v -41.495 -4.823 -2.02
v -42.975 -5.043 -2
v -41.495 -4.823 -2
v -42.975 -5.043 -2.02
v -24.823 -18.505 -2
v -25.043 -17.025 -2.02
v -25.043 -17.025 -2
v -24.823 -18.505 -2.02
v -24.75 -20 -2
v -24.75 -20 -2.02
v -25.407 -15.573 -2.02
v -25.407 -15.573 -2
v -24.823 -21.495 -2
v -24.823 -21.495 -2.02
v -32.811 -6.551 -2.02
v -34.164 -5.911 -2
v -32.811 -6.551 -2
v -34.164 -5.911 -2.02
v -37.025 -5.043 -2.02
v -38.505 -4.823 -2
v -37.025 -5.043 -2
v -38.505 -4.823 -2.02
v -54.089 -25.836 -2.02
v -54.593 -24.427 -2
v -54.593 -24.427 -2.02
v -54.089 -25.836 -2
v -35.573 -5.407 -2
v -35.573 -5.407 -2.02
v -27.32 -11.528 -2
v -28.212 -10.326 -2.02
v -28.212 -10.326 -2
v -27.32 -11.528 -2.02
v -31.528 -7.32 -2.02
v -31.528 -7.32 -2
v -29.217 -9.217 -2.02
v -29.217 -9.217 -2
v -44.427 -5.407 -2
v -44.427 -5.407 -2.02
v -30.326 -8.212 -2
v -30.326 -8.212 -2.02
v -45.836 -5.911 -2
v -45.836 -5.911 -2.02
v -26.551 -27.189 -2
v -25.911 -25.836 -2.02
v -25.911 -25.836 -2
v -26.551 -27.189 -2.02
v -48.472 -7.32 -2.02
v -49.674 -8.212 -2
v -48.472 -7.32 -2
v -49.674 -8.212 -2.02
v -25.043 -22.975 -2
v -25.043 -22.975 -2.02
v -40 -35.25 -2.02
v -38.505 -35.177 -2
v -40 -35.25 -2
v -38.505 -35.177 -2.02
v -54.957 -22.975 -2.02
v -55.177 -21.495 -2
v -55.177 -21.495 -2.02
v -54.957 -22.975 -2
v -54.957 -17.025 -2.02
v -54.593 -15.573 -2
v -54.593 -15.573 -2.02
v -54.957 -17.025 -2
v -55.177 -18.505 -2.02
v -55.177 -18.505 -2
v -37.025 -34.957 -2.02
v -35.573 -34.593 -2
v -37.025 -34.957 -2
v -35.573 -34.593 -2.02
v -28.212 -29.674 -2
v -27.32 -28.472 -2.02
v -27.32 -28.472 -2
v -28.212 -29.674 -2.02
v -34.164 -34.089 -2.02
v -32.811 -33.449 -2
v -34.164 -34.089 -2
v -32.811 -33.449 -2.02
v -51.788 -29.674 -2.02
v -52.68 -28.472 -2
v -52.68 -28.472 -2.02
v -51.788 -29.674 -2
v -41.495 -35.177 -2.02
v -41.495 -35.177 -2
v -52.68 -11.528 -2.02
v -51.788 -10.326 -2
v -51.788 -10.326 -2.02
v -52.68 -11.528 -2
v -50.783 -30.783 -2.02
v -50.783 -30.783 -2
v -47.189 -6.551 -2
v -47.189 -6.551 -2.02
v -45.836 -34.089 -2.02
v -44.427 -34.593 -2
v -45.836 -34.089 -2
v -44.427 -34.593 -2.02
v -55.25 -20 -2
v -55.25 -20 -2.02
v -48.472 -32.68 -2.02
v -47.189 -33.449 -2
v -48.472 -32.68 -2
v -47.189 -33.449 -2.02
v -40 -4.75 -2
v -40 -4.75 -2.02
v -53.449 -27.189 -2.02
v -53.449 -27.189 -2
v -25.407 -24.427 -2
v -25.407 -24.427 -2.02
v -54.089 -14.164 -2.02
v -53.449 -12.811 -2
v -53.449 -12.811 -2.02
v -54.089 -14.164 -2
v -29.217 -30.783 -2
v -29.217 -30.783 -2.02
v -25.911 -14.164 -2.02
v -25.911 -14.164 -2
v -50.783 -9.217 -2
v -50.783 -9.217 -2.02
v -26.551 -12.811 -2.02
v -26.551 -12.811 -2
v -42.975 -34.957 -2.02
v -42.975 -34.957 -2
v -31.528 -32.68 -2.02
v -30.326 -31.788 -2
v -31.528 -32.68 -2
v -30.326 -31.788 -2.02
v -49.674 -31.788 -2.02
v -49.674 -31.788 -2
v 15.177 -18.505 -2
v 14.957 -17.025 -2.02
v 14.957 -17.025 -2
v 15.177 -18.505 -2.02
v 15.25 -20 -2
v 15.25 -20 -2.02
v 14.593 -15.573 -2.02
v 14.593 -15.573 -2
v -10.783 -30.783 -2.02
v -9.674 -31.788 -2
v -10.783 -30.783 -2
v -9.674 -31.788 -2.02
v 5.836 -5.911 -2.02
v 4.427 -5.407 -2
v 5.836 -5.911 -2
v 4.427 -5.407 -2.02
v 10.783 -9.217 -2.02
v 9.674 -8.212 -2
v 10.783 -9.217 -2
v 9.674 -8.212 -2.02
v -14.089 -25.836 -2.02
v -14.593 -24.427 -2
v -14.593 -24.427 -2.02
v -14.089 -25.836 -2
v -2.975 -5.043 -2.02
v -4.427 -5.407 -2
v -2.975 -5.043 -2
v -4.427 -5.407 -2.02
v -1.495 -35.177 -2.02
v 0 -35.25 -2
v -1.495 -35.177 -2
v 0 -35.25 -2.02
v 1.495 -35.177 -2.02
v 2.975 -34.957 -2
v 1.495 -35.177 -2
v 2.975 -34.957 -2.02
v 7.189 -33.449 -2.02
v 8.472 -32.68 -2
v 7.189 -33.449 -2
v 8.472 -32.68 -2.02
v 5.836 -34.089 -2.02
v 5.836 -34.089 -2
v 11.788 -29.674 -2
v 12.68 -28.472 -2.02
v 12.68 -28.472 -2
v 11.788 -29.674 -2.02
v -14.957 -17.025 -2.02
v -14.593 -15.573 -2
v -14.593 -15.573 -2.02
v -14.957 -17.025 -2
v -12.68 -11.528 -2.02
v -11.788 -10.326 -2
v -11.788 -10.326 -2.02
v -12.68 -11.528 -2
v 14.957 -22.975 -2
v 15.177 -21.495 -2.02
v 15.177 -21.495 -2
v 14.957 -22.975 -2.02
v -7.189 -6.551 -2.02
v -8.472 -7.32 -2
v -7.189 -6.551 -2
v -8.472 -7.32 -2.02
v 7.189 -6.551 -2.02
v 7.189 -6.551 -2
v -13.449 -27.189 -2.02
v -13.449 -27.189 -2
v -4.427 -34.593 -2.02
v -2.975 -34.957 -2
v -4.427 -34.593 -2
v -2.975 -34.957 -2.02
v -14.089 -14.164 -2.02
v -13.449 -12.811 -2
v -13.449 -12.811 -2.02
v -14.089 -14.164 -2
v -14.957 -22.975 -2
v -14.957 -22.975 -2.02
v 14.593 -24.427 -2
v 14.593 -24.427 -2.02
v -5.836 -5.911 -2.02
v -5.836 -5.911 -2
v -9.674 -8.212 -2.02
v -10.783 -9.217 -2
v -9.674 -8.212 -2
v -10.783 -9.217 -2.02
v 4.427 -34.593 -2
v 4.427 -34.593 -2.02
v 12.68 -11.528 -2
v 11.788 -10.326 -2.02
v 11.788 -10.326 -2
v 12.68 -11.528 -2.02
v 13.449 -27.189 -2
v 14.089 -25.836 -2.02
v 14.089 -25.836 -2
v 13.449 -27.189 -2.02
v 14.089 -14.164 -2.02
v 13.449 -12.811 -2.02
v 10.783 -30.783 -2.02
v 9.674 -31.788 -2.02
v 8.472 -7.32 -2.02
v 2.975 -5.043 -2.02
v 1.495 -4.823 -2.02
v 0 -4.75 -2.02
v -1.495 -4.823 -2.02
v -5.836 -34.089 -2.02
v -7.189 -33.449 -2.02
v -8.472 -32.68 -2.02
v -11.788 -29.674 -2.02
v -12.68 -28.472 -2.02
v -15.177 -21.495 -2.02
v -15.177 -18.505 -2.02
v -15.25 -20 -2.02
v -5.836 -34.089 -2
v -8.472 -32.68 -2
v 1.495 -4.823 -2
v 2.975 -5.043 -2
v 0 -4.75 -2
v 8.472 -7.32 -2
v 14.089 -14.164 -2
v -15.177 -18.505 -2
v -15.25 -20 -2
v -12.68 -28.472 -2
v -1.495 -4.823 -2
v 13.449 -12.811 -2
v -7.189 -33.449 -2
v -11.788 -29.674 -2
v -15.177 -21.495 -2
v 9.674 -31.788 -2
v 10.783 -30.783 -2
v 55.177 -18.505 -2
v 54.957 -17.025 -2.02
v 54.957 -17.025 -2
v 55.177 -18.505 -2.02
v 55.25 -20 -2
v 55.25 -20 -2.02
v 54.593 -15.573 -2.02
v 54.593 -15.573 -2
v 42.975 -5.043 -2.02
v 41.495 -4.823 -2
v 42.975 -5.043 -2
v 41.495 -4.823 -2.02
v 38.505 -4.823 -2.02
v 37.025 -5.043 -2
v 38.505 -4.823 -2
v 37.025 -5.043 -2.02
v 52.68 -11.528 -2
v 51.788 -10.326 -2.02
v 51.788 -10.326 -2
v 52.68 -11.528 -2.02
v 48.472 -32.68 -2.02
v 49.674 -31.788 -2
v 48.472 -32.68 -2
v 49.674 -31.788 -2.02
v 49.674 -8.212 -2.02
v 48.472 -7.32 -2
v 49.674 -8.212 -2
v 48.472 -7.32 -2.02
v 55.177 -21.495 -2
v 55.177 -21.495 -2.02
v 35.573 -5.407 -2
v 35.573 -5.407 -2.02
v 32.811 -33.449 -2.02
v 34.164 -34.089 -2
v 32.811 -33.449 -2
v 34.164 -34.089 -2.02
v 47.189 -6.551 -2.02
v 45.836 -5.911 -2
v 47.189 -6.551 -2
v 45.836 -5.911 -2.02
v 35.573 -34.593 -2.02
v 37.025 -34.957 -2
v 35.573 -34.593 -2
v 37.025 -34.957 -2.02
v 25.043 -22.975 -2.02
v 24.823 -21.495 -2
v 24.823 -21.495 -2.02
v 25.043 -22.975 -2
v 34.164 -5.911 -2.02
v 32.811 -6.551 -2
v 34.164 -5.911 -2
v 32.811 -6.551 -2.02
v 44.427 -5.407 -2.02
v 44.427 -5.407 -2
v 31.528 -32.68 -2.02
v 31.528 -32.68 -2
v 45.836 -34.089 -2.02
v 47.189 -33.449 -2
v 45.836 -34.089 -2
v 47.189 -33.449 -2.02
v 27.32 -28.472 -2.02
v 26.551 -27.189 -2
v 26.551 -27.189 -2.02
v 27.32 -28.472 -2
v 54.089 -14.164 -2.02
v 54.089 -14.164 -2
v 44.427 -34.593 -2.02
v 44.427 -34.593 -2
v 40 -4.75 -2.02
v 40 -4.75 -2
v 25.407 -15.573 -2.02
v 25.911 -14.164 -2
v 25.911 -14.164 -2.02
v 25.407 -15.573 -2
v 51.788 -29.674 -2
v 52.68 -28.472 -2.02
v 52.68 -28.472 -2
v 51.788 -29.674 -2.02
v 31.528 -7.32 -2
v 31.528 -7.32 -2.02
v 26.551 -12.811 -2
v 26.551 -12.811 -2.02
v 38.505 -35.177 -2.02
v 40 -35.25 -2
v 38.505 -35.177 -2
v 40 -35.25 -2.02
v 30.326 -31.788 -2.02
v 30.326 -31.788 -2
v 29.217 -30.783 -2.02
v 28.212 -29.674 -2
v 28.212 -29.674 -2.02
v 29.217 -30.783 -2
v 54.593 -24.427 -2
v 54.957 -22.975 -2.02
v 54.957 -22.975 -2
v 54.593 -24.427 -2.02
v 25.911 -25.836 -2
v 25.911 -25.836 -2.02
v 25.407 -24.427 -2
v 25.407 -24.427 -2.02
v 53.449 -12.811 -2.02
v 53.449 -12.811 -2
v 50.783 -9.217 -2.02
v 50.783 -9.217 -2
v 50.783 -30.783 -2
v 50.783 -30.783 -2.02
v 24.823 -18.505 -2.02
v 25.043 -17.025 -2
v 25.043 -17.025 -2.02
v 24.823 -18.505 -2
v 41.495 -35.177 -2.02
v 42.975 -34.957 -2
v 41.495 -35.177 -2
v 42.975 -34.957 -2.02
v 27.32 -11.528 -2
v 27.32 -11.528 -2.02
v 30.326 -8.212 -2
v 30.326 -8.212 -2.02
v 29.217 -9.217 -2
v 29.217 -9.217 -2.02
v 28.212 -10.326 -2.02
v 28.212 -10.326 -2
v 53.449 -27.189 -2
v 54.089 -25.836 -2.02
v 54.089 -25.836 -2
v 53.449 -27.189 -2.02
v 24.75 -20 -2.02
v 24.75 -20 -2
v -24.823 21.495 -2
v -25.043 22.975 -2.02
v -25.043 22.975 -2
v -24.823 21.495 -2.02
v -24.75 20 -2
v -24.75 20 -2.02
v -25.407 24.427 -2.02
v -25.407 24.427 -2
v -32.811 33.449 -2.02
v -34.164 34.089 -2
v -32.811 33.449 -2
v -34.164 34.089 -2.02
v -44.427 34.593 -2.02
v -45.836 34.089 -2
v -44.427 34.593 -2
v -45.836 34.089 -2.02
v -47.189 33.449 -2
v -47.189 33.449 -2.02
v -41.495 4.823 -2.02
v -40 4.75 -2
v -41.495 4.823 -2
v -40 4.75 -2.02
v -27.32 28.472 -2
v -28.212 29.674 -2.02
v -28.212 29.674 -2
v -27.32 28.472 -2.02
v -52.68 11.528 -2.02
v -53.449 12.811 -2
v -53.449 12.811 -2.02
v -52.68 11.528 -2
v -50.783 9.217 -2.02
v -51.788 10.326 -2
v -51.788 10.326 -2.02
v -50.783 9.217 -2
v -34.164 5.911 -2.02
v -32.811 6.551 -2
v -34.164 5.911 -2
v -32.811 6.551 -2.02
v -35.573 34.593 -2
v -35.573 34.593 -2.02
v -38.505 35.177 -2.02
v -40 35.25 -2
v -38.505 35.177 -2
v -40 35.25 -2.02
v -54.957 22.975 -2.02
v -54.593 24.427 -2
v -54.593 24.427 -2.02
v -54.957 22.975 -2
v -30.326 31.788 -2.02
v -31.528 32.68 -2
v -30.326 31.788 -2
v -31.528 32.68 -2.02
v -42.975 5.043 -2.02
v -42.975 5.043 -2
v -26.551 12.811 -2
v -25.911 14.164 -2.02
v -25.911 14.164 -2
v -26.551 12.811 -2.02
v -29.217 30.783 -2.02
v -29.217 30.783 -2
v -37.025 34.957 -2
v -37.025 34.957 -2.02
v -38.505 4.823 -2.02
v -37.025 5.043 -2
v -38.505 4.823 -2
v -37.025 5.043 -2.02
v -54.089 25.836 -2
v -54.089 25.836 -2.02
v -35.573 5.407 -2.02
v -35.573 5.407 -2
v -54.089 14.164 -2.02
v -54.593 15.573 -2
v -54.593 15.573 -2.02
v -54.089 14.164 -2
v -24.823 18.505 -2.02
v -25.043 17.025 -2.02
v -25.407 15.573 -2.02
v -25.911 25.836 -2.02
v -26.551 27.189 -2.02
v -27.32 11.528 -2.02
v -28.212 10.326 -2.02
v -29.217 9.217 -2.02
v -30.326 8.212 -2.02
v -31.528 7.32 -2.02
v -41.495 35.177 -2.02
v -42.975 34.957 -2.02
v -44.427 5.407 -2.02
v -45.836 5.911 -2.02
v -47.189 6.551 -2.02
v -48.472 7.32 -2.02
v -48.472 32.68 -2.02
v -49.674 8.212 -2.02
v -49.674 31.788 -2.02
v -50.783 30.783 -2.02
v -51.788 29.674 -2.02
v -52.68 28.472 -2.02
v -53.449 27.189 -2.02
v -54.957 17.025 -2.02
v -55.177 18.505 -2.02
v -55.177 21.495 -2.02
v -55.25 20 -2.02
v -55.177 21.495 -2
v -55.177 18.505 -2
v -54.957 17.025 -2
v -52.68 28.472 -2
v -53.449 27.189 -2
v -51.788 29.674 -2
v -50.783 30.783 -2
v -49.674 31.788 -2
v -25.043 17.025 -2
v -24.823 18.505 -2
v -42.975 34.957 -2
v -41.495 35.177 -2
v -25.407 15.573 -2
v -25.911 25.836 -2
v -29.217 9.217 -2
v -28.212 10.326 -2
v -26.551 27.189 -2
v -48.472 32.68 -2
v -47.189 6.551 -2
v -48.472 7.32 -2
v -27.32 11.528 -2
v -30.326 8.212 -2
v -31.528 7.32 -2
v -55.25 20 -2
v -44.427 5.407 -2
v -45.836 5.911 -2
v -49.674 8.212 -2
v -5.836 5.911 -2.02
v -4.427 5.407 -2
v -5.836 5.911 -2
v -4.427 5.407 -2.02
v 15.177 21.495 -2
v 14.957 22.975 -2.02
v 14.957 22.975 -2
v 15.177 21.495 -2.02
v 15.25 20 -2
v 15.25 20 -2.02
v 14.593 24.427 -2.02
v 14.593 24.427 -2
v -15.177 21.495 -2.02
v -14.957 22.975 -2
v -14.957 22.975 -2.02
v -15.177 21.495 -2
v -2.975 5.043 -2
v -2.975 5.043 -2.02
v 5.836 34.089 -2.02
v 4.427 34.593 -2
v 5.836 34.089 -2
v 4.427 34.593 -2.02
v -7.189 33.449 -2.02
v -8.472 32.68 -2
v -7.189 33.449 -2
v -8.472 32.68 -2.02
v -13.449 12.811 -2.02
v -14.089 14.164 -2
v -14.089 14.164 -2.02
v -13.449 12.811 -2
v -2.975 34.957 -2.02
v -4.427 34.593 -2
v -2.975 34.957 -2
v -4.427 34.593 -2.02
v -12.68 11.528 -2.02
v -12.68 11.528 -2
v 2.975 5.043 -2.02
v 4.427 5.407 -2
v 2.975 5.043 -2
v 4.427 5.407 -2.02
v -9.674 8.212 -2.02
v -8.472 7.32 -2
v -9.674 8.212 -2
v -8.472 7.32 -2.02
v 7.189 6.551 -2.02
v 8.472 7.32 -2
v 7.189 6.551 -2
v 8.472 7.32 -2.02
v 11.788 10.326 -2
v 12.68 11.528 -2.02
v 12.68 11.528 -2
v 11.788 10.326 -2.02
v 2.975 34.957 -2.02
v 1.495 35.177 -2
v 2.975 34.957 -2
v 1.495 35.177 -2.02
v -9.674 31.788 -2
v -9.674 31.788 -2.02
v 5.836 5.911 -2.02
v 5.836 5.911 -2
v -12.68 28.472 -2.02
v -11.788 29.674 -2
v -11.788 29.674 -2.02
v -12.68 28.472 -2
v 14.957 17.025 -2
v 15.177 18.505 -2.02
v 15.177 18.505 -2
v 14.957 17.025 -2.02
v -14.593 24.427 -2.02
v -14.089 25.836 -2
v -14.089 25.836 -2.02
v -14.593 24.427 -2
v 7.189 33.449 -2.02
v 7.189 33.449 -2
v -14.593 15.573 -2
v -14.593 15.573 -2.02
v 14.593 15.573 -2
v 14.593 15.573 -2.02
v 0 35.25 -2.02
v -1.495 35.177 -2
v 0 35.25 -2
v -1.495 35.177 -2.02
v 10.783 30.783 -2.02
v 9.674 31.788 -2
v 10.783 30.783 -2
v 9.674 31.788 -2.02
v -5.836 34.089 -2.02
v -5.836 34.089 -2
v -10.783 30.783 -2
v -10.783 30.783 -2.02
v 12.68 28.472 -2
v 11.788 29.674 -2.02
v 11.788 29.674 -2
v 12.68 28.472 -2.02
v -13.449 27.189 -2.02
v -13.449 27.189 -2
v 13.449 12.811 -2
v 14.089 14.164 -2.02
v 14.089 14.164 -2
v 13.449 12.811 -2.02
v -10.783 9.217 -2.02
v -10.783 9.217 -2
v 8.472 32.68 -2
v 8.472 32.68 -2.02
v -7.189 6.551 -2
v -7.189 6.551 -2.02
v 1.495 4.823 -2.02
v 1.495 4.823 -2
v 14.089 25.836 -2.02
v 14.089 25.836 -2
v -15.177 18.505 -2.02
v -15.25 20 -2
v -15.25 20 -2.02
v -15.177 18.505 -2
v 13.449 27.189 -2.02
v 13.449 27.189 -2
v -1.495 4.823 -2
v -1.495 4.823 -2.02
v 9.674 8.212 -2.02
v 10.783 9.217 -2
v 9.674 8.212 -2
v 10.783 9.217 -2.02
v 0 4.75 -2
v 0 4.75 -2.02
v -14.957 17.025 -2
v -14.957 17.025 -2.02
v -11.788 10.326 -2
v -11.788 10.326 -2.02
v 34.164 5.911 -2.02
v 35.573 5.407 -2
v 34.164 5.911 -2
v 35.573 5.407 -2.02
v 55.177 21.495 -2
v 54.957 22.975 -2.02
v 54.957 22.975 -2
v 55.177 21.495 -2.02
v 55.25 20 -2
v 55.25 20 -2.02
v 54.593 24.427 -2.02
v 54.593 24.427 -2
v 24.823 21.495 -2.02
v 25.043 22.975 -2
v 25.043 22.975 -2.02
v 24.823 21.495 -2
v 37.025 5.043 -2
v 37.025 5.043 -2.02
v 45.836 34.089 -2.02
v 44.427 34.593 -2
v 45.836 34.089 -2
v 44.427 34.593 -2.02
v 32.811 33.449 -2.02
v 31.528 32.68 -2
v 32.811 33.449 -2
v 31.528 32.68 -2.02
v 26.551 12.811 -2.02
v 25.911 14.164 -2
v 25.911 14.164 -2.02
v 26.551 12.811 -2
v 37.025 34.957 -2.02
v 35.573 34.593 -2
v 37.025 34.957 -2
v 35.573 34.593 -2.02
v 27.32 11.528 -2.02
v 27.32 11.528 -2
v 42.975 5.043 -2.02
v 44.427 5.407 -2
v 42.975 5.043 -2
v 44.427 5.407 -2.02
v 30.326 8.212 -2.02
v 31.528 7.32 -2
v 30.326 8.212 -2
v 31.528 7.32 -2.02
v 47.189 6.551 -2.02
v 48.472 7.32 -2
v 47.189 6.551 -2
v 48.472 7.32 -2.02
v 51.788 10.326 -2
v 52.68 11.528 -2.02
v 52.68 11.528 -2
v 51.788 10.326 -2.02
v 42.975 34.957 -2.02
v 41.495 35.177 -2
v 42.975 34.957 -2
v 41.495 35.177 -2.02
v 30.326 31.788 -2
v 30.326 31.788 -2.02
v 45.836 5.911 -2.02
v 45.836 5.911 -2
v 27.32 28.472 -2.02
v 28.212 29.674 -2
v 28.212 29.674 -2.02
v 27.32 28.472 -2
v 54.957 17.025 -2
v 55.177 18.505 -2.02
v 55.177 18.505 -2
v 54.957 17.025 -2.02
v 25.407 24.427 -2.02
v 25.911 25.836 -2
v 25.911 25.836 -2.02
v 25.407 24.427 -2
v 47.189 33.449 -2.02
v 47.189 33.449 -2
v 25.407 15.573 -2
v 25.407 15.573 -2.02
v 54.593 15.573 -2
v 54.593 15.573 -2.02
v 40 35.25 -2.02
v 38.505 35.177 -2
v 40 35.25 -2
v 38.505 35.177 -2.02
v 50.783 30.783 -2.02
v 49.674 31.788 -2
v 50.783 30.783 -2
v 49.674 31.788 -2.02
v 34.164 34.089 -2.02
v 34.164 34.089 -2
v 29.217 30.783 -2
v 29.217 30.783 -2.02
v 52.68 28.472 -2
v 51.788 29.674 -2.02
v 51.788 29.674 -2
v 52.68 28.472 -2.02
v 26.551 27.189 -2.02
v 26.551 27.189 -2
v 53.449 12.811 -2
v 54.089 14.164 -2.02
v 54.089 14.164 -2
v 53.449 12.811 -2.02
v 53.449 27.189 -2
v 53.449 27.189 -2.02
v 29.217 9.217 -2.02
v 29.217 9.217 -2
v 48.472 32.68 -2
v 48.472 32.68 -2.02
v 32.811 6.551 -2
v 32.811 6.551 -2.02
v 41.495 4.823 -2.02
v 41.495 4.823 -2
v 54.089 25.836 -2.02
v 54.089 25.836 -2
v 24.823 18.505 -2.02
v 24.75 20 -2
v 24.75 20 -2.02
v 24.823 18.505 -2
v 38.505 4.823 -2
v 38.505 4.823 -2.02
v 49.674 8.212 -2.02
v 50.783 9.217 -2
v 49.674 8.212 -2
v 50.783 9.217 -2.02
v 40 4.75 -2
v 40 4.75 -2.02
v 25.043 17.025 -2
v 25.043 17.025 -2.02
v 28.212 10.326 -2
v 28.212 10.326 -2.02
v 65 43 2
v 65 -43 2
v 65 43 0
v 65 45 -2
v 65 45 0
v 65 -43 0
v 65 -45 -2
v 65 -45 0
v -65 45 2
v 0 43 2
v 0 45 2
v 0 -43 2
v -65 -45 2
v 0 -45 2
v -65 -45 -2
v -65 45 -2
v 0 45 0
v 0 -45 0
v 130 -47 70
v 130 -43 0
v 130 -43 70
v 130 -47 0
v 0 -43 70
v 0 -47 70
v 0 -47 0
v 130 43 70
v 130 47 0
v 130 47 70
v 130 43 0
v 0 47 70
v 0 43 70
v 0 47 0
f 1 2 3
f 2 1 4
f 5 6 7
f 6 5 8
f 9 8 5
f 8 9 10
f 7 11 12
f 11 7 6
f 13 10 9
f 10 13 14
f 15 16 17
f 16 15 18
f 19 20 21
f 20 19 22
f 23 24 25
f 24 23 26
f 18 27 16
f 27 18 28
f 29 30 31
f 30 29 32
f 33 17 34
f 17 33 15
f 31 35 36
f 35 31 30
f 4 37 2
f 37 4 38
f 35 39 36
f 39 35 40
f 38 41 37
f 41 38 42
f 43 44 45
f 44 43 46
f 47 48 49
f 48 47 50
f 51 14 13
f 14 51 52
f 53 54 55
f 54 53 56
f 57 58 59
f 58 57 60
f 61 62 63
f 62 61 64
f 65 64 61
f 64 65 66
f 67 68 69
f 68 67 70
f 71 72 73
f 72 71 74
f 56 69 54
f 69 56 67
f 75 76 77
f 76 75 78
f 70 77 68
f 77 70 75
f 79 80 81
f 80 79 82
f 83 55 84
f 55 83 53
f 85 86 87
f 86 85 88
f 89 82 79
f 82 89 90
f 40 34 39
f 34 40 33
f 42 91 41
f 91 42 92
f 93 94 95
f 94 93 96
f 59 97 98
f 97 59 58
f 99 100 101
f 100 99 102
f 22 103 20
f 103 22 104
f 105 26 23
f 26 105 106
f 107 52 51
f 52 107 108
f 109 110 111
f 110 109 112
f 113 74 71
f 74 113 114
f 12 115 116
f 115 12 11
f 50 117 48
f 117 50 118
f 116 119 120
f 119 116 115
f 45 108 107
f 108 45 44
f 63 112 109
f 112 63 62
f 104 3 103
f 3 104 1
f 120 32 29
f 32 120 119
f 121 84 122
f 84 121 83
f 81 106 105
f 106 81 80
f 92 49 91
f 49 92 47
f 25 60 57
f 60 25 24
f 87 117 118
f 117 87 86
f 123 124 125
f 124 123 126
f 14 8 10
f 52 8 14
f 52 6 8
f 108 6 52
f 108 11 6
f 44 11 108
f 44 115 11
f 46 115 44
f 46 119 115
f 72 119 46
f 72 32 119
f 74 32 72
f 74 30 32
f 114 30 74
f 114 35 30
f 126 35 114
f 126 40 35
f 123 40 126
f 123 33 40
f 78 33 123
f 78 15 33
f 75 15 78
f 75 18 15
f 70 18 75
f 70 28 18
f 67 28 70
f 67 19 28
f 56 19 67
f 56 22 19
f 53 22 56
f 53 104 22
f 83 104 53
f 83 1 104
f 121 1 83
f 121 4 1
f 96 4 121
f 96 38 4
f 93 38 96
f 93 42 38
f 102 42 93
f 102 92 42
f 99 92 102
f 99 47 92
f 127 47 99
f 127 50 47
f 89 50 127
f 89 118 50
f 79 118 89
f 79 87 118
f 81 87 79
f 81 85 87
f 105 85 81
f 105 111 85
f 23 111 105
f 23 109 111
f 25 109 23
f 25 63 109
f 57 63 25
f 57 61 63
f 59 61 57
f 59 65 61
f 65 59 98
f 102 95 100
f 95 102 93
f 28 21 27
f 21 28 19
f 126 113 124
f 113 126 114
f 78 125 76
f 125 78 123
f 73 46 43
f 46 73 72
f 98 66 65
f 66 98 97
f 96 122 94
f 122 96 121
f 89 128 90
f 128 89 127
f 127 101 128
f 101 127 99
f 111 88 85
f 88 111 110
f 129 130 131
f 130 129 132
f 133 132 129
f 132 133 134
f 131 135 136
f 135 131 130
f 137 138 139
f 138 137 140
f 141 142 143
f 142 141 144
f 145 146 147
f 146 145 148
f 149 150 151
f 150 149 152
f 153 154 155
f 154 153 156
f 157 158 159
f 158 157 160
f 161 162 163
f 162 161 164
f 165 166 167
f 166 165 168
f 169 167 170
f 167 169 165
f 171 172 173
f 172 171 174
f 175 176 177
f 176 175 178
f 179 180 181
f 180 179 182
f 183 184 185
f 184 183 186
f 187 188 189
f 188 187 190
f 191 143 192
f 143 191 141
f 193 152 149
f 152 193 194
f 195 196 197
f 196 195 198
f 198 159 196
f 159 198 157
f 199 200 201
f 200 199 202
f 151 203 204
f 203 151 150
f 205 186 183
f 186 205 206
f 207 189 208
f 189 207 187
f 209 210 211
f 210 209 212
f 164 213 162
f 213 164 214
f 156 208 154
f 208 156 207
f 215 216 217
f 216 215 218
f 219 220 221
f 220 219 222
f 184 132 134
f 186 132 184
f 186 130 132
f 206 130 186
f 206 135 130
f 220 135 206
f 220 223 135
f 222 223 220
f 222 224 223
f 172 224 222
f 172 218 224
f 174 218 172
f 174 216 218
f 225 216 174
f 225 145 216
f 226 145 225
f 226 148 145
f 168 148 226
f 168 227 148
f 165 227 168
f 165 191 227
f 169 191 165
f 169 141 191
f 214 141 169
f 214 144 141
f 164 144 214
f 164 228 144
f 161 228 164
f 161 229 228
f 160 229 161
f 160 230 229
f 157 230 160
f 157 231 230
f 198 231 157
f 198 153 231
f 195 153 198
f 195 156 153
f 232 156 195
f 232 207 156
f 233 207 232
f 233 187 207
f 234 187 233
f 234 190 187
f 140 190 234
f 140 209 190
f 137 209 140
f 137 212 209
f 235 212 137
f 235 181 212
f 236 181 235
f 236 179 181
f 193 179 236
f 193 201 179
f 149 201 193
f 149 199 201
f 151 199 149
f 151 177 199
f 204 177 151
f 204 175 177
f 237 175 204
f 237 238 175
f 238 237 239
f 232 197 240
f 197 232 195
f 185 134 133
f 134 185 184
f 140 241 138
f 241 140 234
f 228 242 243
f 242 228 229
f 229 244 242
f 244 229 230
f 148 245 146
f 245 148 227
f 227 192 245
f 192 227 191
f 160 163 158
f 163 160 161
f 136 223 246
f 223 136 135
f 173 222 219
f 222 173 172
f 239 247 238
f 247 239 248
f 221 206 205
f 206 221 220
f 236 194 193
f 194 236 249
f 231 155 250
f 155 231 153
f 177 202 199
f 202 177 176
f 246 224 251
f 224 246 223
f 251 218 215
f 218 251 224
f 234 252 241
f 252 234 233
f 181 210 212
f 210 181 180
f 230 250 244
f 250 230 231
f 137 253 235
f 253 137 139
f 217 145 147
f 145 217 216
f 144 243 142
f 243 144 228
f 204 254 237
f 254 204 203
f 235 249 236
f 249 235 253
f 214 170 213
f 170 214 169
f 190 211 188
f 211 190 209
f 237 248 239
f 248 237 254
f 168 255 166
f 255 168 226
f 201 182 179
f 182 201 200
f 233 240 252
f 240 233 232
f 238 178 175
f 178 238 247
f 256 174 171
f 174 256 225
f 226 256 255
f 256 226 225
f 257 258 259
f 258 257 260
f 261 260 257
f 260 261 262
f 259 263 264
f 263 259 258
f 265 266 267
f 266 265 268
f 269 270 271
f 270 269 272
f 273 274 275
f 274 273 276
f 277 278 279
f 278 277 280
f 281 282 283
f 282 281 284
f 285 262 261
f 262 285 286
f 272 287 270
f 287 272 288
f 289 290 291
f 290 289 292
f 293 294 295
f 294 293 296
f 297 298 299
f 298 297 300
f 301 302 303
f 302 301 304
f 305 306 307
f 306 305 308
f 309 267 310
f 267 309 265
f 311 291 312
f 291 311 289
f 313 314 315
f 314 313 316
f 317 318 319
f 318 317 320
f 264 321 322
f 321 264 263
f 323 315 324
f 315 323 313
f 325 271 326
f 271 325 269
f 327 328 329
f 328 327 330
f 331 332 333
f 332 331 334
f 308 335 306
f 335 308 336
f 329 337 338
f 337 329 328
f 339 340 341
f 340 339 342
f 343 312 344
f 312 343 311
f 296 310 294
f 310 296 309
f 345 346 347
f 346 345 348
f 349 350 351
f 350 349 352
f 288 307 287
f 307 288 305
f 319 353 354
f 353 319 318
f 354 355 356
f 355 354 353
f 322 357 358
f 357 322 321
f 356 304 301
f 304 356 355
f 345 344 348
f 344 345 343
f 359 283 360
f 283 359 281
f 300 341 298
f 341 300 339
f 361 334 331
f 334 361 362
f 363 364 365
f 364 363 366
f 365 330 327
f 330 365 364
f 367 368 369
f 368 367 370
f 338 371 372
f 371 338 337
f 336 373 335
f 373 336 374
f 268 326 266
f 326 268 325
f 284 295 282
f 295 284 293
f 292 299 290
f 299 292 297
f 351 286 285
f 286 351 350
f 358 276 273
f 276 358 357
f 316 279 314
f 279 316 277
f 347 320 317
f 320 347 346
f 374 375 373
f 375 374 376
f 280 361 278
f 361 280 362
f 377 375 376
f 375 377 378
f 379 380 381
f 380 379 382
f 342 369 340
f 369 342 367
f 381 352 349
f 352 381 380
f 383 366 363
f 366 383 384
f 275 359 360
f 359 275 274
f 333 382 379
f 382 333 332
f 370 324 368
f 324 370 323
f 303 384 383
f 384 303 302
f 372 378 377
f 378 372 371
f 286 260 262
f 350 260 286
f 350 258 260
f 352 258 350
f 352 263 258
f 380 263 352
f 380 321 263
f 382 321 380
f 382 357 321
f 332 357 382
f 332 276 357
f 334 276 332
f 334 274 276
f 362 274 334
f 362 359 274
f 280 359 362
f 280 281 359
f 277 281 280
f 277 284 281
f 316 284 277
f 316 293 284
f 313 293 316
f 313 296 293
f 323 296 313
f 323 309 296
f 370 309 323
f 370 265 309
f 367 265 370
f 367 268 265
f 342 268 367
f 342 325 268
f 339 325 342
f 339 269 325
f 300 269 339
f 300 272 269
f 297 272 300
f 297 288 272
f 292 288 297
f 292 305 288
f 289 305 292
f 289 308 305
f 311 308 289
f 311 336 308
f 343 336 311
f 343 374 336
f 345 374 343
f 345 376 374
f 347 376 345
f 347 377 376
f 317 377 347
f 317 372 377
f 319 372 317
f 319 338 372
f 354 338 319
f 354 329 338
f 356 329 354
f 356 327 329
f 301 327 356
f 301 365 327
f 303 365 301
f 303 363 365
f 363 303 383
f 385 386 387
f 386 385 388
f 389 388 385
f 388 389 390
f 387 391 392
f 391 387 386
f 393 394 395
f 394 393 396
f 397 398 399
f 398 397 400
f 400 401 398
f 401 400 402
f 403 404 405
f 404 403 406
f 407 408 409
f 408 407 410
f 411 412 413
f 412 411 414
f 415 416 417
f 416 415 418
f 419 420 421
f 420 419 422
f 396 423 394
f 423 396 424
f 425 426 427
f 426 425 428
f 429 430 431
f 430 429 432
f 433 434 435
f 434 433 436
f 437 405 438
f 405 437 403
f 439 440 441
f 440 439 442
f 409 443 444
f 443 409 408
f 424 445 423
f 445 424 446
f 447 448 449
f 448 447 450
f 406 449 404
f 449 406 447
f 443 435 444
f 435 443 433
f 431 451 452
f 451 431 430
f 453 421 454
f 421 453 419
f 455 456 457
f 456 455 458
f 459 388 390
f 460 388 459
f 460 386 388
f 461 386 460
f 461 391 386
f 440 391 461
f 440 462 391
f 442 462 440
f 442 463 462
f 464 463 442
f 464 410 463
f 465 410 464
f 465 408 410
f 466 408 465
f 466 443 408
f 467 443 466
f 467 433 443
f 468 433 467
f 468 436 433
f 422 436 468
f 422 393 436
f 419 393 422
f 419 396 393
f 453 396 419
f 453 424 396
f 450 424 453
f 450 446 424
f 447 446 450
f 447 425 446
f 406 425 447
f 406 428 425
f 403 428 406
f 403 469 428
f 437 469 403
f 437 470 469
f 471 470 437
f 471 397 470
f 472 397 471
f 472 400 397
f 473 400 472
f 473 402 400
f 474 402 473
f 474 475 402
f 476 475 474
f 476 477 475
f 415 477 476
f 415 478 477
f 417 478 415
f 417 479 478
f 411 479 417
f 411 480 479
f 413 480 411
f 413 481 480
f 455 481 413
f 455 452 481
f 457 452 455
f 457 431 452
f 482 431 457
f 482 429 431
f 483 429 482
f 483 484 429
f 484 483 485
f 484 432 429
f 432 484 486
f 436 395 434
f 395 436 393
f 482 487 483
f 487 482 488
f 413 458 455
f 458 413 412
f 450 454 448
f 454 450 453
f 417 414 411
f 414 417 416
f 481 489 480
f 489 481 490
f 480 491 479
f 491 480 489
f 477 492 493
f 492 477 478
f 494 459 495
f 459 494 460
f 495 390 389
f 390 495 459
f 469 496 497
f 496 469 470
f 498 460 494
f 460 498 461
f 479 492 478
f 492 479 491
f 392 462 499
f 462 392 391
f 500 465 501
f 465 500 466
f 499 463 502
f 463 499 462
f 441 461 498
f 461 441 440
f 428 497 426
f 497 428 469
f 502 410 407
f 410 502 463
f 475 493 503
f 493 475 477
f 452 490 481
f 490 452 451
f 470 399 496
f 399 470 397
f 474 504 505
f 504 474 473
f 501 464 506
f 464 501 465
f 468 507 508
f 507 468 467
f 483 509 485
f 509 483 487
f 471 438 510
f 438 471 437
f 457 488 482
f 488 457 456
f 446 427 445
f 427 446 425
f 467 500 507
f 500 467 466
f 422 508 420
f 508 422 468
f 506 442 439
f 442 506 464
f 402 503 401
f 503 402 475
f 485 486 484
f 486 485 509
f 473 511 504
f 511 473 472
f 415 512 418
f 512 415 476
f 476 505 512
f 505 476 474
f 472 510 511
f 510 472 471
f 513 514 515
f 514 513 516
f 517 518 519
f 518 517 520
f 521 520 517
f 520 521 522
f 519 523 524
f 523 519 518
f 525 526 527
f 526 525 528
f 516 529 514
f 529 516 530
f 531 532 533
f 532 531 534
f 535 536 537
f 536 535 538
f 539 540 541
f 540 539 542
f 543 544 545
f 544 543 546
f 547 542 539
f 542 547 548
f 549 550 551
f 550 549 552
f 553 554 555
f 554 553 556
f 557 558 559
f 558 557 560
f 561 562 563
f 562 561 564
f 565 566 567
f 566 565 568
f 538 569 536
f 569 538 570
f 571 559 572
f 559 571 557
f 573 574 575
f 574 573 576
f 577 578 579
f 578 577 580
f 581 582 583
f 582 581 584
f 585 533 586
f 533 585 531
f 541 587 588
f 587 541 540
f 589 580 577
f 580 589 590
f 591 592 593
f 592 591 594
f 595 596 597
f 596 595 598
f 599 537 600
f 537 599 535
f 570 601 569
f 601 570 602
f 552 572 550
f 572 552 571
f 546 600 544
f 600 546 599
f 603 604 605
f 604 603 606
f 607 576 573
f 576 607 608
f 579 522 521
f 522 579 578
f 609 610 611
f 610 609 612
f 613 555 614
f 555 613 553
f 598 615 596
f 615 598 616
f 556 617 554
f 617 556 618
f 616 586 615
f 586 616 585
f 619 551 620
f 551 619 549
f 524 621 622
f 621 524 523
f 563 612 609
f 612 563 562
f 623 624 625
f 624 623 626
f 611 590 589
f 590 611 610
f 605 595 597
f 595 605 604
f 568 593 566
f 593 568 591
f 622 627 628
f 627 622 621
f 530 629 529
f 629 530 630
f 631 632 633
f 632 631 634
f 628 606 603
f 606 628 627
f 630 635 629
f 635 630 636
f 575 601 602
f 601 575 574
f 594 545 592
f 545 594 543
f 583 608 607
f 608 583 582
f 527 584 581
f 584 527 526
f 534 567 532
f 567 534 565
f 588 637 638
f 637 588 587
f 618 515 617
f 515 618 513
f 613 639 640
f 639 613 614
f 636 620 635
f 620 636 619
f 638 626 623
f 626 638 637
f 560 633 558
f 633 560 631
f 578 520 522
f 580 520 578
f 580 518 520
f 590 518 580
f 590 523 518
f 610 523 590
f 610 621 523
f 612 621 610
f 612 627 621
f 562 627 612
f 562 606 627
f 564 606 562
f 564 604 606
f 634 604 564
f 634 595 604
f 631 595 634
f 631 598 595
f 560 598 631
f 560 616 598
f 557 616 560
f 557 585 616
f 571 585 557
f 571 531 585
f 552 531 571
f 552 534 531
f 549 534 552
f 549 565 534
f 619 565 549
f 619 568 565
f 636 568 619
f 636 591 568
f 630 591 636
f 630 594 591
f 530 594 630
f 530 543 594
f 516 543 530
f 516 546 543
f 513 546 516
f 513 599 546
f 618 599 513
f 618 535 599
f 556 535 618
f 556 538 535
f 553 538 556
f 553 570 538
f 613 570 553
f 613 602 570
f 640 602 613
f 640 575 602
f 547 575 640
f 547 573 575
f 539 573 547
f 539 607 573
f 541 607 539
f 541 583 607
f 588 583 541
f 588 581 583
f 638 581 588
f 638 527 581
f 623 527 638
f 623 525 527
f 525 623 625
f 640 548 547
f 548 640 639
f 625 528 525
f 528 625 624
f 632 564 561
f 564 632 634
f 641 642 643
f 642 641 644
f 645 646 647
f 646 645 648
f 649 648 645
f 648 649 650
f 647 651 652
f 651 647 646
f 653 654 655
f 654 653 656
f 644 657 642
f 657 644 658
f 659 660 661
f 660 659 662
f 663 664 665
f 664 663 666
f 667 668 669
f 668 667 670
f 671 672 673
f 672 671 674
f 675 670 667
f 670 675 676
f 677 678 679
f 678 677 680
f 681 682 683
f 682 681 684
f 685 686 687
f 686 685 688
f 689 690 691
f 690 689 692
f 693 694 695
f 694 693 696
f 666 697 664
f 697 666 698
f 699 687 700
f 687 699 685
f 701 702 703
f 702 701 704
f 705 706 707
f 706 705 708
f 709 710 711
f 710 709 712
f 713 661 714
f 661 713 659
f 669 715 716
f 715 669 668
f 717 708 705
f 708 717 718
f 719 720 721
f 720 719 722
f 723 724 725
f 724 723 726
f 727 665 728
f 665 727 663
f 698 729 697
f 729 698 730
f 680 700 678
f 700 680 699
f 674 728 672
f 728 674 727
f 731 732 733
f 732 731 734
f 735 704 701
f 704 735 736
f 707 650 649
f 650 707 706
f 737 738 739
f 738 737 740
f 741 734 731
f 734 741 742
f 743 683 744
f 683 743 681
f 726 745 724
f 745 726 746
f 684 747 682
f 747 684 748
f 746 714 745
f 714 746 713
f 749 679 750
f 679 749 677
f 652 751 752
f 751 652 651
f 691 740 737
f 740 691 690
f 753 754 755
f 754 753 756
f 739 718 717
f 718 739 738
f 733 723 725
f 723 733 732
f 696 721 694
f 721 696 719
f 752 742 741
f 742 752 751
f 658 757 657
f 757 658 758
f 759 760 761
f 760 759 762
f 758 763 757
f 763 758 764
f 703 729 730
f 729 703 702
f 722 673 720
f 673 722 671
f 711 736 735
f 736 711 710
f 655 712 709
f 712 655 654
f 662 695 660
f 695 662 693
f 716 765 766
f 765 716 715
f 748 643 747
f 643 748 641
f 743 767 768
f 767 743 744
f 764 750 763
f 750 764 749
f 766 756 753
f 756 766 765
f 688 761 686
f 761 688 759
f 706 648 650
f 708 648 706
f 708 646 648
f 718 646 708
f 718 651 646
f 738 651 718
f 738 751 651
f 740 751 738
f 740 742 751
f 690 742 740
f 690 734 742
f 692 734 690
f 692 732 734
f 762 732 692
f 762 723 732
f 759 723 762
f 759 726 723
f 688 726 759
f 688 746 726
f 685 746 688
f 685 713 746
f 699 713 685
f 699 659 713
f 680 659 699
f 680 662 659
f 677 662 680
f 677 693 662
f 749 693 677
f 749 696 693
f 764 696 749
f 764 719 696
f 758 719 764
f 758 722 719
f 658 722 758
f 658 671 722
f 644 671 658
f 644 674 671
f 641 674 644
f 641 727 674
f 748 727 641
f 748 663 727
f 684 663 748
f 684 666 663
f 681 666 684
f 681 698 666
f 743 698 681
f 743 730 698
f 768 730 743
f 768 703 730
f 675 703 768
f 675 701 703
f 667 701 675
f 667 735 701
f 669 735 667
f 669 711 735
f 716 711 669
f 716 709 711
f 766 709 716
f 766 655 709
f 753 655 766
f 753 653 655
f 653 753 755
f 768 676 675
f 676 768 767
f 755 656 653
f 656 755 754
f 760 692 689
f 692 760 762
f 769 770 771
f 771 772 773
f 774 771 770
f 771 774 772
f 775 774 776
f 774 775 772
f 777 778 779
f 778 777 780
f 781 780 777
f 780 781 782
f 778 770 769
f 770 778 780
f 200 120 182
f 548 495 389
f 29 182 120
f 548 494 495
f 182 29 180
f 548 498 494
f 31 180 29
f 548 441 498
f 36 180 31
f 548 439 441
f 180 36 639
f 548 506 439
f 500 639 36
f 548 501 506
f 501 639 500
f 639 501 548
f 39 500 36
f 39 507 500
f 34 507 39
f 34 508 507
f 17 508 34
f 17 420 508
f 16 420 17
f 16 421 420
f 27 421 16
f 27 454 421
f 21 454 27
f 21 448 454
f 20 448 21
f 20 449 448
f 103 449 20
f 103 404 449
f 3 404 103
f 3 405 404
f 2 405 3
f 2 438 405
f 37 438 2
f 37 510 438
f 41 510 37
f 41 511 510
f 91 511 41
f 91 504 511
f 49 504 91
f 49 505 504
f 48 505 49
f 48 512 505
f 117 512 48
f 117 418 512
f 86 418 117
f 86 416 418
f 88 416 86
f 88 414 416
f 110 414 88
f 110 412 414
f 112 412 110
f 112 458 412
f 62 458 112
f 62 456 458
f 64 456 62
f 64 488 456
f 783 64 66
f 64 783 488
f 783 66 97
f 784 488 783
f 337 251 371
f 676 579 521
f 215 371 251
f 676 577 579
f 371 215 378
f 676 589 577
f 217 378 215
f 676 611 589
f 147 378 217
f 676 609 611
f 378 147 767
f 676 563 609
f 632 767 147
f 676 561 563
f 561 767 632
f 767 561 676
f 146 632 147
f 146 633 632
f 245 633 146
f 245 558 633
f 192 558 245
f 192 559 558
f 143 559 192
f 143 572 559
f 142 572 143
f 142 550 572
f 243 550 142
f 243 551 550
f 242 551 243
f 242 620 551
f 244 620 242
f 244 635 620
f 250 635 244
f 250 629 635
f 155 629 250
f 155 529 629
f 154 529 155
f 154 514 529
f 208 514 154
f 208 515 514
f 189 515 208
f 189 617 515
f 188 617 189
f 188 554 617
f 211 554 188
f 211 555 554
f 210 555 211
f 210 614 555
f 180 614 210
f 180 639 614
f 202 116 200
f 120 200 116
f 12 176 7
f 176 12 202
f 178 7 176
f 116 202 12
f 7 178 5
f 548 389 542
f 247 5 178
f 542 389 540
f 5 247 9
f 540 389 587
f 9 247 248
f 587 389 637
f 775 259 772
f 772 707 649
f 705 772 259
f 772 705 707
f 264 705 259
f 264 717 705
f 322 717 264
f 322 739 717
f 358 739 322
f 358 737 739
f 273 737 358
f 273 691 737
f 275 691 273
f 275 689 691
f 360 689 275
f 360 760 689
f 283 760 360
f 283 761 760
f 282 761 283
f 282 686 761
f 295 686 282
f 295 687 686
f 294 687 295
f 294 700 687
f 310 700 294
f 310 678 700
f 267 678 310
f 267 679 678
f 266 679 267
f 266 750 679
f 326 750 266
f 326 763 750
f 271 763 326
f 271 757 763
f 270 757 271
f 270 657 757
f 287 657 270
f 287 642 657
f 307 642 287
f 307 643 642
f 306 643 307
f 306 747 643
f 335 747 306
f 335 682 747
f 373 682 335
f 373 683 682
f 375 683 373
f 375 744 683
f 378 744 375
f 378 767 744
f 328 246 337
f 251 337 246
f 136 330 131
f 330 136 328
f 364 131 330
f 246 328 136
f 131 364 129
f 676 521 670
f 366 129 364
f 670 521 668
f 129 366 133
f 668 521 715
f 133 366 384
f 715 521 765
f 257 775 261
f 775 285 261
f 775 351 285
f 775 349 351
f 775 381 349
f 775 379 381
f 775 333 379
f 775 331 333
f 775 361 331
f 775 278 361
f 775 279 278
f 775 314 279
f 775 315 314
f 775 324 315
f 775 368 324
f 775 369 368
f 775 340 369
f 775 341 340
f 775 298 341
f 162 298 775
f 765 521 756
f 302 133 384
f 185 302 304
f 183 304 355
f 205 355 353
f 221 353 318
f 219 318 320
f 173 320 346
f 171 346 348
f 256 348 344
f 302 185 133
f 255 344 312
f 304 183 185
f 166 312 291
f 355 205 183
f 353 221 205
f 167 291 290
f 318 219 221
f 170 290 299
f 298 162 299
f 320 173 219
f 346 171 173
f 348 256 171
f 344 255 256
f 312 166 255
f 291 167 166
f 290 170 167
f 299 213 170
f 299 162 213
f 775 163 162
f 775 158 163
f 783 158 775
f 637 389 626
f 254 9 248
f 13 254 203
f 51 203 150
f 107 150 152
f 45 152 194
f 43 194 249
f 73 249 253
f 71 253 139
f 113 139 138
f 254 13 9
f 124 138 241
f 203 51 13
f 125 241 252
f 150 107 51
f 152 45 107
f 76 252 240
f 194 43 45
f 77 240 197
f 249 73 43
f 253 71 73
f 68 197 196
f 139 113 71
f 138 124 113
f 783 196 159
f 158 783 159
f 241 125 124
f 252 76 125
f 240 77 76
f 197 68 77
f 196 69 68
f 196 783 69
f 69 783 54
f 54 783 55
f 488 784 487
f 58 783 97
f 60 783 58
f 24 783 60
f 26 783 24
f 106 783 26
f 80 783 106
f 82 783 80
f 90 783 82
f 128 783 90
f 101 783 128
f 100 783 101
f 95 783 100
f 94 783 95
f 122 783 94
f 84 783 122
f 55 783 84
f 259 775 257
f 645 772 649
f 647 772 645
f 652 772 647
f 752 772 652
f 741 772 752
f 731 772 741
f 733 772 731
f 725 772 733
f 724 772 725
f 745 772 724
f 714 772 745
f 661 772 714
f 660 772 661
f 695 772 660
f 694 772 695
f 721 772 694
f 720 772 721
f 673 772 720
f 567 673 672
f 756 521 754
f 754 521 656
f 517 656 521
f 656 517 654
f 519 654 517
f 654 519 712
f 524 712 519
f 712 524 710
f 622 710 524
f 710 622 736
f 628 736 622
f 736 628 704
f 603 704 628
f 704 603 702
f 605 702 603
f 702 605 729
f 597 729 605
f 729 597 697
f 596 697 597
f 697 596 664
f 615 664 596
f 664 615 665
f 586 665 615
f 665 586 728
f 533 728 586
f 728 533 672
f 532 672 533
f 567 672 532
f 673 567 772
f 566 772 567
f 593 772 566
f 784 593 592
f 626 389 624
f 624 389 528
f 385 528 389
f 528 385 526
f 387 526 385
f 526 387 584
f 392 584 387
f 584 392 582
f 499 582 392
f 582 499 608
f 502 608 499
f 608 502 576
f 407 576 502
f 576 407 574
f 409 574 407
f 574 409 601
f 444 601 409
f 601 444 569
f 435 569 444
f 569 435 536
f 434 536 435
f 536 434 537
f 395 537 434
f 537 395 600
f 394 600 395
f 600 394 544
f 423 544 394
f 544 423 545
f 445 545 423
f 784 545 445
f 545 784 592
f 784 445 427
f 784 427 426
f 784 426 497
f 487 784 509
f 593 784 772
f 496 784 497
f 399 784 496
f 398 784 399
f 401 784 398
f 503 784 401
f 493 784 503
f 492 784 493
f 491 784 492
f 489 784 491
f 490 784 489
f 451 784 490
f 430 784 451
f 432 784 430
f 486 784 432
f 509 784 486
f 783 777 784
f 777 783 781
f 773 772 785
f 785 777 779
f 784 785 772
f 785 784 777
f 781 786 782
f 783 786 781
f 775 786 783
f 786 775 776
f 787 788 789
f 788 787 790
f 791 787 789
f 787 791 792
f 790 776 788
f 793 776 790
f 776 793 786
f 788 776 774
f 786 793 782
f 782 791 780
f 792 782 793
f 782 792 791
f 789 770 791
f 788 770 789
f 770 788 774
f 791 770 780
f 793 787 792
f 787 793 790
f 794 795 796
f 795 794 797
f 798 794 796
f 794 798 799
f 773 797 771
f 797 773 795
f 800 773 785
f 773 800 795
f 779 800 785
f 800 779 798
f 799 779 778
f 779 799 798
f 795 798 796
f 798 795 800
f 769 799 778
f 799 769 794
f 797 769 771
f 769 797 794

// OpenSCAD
// Dimensions for the rack for six 50 mL conical (Falcon-type) tubes
// Print orientation: flat plate on bed (z = 0 to 4), walls rise from edges
// After flipping, rack stands on walls, tubes through holes

// Plate dimensions
plate_length_X = 130;   // mm
plate_width_Y = 90;     // mm
plate_thickness_Z = 4;   // mm

// Hole parameters
hole_diameter = 30.5;   // mm
hole_spacing_X = 40;   // mm (center-to-center along X)
hole_spacing_Y = 40;   // mm (center-to-center along Y)
num_holes_X = 3;       // 3 holes along X (2 rows of 3)
num_holes_Y = 2;       // 2 rows along Y

// Wall parameters
wall_length_X = plate_length_X;     // 130 mm
wall_thickness_Y = 4;                 // mm (along Y)
wall_height_Z = 70;                 // mm (from plate to top)

// Set resolution for smooth curves
$fn = 64;

// Main module
module rack() {
    // 1. Plate: flat rectangular base, centered at origin (X, Y) = (0, 0)
    // Plate extends from -65 to +65 in X, -45 to +45 in Y, z = 0 to 4
    translate([0, 0, 0])
        cube([plate_length_X, plate_width_Y, plate_thickness_Z], center = true);

    // 2. Holes: 2 rows of 3 holes, centered on plate
    // Center of grid: (0, 0) for the whole array
    // Hole positions: offset from center by half-grid span
    for (i = [0 : num_holes_Y - 1]) {
        for (j = [0 : num_holes_X - 1]) {
            // Calculate hole center in X and Y
            hole_x = (j - (num_holes_X - 1)/2) * hole_spacing_X;
            hole_y = (i - (num_holes_Y - 1)/2) * hole_spacing_Y;

            // Cut hole through the plate (extend slightly beyond to ensure clean cut)
            translate([hole_x, hole_y, -0.01])
                cylinder(h = plate_thickness_Z + 0.02, d = hole_diameter, center = true);
        }
    }

    // 3. Wall along Y = -plate_width_Y/2 (bottom long edge)
    // Wall is 4 mm thick in Y, 130 mm long in X, from z = 0 to 70
    // Positioned at Y = -plate_width_Y/2 - wall_thickness_Y/2 (so wall is flush with edge)
    wall_offset_Y_bottom = -plate_width_Y/2 - wall_thickness_Y/2;
    translate([0, wall_offset_Y_bottom, 0])
        cube([wall_length_X, wall_thickness_Y, wall_height_Z], center = false);

    // 4. Wall along Y = +plate_width_Y/2 (top long edge)
    wall_offset_Y_top = +plate_width_Y/2 - wall_thickness_Y/2;
    translate([0, wall_offset_Y_top, 0])
        cube([wall_length_X, wall_thickness_Y, wall_height_Z], center = false);
}

// Render the entire rack
rack();
